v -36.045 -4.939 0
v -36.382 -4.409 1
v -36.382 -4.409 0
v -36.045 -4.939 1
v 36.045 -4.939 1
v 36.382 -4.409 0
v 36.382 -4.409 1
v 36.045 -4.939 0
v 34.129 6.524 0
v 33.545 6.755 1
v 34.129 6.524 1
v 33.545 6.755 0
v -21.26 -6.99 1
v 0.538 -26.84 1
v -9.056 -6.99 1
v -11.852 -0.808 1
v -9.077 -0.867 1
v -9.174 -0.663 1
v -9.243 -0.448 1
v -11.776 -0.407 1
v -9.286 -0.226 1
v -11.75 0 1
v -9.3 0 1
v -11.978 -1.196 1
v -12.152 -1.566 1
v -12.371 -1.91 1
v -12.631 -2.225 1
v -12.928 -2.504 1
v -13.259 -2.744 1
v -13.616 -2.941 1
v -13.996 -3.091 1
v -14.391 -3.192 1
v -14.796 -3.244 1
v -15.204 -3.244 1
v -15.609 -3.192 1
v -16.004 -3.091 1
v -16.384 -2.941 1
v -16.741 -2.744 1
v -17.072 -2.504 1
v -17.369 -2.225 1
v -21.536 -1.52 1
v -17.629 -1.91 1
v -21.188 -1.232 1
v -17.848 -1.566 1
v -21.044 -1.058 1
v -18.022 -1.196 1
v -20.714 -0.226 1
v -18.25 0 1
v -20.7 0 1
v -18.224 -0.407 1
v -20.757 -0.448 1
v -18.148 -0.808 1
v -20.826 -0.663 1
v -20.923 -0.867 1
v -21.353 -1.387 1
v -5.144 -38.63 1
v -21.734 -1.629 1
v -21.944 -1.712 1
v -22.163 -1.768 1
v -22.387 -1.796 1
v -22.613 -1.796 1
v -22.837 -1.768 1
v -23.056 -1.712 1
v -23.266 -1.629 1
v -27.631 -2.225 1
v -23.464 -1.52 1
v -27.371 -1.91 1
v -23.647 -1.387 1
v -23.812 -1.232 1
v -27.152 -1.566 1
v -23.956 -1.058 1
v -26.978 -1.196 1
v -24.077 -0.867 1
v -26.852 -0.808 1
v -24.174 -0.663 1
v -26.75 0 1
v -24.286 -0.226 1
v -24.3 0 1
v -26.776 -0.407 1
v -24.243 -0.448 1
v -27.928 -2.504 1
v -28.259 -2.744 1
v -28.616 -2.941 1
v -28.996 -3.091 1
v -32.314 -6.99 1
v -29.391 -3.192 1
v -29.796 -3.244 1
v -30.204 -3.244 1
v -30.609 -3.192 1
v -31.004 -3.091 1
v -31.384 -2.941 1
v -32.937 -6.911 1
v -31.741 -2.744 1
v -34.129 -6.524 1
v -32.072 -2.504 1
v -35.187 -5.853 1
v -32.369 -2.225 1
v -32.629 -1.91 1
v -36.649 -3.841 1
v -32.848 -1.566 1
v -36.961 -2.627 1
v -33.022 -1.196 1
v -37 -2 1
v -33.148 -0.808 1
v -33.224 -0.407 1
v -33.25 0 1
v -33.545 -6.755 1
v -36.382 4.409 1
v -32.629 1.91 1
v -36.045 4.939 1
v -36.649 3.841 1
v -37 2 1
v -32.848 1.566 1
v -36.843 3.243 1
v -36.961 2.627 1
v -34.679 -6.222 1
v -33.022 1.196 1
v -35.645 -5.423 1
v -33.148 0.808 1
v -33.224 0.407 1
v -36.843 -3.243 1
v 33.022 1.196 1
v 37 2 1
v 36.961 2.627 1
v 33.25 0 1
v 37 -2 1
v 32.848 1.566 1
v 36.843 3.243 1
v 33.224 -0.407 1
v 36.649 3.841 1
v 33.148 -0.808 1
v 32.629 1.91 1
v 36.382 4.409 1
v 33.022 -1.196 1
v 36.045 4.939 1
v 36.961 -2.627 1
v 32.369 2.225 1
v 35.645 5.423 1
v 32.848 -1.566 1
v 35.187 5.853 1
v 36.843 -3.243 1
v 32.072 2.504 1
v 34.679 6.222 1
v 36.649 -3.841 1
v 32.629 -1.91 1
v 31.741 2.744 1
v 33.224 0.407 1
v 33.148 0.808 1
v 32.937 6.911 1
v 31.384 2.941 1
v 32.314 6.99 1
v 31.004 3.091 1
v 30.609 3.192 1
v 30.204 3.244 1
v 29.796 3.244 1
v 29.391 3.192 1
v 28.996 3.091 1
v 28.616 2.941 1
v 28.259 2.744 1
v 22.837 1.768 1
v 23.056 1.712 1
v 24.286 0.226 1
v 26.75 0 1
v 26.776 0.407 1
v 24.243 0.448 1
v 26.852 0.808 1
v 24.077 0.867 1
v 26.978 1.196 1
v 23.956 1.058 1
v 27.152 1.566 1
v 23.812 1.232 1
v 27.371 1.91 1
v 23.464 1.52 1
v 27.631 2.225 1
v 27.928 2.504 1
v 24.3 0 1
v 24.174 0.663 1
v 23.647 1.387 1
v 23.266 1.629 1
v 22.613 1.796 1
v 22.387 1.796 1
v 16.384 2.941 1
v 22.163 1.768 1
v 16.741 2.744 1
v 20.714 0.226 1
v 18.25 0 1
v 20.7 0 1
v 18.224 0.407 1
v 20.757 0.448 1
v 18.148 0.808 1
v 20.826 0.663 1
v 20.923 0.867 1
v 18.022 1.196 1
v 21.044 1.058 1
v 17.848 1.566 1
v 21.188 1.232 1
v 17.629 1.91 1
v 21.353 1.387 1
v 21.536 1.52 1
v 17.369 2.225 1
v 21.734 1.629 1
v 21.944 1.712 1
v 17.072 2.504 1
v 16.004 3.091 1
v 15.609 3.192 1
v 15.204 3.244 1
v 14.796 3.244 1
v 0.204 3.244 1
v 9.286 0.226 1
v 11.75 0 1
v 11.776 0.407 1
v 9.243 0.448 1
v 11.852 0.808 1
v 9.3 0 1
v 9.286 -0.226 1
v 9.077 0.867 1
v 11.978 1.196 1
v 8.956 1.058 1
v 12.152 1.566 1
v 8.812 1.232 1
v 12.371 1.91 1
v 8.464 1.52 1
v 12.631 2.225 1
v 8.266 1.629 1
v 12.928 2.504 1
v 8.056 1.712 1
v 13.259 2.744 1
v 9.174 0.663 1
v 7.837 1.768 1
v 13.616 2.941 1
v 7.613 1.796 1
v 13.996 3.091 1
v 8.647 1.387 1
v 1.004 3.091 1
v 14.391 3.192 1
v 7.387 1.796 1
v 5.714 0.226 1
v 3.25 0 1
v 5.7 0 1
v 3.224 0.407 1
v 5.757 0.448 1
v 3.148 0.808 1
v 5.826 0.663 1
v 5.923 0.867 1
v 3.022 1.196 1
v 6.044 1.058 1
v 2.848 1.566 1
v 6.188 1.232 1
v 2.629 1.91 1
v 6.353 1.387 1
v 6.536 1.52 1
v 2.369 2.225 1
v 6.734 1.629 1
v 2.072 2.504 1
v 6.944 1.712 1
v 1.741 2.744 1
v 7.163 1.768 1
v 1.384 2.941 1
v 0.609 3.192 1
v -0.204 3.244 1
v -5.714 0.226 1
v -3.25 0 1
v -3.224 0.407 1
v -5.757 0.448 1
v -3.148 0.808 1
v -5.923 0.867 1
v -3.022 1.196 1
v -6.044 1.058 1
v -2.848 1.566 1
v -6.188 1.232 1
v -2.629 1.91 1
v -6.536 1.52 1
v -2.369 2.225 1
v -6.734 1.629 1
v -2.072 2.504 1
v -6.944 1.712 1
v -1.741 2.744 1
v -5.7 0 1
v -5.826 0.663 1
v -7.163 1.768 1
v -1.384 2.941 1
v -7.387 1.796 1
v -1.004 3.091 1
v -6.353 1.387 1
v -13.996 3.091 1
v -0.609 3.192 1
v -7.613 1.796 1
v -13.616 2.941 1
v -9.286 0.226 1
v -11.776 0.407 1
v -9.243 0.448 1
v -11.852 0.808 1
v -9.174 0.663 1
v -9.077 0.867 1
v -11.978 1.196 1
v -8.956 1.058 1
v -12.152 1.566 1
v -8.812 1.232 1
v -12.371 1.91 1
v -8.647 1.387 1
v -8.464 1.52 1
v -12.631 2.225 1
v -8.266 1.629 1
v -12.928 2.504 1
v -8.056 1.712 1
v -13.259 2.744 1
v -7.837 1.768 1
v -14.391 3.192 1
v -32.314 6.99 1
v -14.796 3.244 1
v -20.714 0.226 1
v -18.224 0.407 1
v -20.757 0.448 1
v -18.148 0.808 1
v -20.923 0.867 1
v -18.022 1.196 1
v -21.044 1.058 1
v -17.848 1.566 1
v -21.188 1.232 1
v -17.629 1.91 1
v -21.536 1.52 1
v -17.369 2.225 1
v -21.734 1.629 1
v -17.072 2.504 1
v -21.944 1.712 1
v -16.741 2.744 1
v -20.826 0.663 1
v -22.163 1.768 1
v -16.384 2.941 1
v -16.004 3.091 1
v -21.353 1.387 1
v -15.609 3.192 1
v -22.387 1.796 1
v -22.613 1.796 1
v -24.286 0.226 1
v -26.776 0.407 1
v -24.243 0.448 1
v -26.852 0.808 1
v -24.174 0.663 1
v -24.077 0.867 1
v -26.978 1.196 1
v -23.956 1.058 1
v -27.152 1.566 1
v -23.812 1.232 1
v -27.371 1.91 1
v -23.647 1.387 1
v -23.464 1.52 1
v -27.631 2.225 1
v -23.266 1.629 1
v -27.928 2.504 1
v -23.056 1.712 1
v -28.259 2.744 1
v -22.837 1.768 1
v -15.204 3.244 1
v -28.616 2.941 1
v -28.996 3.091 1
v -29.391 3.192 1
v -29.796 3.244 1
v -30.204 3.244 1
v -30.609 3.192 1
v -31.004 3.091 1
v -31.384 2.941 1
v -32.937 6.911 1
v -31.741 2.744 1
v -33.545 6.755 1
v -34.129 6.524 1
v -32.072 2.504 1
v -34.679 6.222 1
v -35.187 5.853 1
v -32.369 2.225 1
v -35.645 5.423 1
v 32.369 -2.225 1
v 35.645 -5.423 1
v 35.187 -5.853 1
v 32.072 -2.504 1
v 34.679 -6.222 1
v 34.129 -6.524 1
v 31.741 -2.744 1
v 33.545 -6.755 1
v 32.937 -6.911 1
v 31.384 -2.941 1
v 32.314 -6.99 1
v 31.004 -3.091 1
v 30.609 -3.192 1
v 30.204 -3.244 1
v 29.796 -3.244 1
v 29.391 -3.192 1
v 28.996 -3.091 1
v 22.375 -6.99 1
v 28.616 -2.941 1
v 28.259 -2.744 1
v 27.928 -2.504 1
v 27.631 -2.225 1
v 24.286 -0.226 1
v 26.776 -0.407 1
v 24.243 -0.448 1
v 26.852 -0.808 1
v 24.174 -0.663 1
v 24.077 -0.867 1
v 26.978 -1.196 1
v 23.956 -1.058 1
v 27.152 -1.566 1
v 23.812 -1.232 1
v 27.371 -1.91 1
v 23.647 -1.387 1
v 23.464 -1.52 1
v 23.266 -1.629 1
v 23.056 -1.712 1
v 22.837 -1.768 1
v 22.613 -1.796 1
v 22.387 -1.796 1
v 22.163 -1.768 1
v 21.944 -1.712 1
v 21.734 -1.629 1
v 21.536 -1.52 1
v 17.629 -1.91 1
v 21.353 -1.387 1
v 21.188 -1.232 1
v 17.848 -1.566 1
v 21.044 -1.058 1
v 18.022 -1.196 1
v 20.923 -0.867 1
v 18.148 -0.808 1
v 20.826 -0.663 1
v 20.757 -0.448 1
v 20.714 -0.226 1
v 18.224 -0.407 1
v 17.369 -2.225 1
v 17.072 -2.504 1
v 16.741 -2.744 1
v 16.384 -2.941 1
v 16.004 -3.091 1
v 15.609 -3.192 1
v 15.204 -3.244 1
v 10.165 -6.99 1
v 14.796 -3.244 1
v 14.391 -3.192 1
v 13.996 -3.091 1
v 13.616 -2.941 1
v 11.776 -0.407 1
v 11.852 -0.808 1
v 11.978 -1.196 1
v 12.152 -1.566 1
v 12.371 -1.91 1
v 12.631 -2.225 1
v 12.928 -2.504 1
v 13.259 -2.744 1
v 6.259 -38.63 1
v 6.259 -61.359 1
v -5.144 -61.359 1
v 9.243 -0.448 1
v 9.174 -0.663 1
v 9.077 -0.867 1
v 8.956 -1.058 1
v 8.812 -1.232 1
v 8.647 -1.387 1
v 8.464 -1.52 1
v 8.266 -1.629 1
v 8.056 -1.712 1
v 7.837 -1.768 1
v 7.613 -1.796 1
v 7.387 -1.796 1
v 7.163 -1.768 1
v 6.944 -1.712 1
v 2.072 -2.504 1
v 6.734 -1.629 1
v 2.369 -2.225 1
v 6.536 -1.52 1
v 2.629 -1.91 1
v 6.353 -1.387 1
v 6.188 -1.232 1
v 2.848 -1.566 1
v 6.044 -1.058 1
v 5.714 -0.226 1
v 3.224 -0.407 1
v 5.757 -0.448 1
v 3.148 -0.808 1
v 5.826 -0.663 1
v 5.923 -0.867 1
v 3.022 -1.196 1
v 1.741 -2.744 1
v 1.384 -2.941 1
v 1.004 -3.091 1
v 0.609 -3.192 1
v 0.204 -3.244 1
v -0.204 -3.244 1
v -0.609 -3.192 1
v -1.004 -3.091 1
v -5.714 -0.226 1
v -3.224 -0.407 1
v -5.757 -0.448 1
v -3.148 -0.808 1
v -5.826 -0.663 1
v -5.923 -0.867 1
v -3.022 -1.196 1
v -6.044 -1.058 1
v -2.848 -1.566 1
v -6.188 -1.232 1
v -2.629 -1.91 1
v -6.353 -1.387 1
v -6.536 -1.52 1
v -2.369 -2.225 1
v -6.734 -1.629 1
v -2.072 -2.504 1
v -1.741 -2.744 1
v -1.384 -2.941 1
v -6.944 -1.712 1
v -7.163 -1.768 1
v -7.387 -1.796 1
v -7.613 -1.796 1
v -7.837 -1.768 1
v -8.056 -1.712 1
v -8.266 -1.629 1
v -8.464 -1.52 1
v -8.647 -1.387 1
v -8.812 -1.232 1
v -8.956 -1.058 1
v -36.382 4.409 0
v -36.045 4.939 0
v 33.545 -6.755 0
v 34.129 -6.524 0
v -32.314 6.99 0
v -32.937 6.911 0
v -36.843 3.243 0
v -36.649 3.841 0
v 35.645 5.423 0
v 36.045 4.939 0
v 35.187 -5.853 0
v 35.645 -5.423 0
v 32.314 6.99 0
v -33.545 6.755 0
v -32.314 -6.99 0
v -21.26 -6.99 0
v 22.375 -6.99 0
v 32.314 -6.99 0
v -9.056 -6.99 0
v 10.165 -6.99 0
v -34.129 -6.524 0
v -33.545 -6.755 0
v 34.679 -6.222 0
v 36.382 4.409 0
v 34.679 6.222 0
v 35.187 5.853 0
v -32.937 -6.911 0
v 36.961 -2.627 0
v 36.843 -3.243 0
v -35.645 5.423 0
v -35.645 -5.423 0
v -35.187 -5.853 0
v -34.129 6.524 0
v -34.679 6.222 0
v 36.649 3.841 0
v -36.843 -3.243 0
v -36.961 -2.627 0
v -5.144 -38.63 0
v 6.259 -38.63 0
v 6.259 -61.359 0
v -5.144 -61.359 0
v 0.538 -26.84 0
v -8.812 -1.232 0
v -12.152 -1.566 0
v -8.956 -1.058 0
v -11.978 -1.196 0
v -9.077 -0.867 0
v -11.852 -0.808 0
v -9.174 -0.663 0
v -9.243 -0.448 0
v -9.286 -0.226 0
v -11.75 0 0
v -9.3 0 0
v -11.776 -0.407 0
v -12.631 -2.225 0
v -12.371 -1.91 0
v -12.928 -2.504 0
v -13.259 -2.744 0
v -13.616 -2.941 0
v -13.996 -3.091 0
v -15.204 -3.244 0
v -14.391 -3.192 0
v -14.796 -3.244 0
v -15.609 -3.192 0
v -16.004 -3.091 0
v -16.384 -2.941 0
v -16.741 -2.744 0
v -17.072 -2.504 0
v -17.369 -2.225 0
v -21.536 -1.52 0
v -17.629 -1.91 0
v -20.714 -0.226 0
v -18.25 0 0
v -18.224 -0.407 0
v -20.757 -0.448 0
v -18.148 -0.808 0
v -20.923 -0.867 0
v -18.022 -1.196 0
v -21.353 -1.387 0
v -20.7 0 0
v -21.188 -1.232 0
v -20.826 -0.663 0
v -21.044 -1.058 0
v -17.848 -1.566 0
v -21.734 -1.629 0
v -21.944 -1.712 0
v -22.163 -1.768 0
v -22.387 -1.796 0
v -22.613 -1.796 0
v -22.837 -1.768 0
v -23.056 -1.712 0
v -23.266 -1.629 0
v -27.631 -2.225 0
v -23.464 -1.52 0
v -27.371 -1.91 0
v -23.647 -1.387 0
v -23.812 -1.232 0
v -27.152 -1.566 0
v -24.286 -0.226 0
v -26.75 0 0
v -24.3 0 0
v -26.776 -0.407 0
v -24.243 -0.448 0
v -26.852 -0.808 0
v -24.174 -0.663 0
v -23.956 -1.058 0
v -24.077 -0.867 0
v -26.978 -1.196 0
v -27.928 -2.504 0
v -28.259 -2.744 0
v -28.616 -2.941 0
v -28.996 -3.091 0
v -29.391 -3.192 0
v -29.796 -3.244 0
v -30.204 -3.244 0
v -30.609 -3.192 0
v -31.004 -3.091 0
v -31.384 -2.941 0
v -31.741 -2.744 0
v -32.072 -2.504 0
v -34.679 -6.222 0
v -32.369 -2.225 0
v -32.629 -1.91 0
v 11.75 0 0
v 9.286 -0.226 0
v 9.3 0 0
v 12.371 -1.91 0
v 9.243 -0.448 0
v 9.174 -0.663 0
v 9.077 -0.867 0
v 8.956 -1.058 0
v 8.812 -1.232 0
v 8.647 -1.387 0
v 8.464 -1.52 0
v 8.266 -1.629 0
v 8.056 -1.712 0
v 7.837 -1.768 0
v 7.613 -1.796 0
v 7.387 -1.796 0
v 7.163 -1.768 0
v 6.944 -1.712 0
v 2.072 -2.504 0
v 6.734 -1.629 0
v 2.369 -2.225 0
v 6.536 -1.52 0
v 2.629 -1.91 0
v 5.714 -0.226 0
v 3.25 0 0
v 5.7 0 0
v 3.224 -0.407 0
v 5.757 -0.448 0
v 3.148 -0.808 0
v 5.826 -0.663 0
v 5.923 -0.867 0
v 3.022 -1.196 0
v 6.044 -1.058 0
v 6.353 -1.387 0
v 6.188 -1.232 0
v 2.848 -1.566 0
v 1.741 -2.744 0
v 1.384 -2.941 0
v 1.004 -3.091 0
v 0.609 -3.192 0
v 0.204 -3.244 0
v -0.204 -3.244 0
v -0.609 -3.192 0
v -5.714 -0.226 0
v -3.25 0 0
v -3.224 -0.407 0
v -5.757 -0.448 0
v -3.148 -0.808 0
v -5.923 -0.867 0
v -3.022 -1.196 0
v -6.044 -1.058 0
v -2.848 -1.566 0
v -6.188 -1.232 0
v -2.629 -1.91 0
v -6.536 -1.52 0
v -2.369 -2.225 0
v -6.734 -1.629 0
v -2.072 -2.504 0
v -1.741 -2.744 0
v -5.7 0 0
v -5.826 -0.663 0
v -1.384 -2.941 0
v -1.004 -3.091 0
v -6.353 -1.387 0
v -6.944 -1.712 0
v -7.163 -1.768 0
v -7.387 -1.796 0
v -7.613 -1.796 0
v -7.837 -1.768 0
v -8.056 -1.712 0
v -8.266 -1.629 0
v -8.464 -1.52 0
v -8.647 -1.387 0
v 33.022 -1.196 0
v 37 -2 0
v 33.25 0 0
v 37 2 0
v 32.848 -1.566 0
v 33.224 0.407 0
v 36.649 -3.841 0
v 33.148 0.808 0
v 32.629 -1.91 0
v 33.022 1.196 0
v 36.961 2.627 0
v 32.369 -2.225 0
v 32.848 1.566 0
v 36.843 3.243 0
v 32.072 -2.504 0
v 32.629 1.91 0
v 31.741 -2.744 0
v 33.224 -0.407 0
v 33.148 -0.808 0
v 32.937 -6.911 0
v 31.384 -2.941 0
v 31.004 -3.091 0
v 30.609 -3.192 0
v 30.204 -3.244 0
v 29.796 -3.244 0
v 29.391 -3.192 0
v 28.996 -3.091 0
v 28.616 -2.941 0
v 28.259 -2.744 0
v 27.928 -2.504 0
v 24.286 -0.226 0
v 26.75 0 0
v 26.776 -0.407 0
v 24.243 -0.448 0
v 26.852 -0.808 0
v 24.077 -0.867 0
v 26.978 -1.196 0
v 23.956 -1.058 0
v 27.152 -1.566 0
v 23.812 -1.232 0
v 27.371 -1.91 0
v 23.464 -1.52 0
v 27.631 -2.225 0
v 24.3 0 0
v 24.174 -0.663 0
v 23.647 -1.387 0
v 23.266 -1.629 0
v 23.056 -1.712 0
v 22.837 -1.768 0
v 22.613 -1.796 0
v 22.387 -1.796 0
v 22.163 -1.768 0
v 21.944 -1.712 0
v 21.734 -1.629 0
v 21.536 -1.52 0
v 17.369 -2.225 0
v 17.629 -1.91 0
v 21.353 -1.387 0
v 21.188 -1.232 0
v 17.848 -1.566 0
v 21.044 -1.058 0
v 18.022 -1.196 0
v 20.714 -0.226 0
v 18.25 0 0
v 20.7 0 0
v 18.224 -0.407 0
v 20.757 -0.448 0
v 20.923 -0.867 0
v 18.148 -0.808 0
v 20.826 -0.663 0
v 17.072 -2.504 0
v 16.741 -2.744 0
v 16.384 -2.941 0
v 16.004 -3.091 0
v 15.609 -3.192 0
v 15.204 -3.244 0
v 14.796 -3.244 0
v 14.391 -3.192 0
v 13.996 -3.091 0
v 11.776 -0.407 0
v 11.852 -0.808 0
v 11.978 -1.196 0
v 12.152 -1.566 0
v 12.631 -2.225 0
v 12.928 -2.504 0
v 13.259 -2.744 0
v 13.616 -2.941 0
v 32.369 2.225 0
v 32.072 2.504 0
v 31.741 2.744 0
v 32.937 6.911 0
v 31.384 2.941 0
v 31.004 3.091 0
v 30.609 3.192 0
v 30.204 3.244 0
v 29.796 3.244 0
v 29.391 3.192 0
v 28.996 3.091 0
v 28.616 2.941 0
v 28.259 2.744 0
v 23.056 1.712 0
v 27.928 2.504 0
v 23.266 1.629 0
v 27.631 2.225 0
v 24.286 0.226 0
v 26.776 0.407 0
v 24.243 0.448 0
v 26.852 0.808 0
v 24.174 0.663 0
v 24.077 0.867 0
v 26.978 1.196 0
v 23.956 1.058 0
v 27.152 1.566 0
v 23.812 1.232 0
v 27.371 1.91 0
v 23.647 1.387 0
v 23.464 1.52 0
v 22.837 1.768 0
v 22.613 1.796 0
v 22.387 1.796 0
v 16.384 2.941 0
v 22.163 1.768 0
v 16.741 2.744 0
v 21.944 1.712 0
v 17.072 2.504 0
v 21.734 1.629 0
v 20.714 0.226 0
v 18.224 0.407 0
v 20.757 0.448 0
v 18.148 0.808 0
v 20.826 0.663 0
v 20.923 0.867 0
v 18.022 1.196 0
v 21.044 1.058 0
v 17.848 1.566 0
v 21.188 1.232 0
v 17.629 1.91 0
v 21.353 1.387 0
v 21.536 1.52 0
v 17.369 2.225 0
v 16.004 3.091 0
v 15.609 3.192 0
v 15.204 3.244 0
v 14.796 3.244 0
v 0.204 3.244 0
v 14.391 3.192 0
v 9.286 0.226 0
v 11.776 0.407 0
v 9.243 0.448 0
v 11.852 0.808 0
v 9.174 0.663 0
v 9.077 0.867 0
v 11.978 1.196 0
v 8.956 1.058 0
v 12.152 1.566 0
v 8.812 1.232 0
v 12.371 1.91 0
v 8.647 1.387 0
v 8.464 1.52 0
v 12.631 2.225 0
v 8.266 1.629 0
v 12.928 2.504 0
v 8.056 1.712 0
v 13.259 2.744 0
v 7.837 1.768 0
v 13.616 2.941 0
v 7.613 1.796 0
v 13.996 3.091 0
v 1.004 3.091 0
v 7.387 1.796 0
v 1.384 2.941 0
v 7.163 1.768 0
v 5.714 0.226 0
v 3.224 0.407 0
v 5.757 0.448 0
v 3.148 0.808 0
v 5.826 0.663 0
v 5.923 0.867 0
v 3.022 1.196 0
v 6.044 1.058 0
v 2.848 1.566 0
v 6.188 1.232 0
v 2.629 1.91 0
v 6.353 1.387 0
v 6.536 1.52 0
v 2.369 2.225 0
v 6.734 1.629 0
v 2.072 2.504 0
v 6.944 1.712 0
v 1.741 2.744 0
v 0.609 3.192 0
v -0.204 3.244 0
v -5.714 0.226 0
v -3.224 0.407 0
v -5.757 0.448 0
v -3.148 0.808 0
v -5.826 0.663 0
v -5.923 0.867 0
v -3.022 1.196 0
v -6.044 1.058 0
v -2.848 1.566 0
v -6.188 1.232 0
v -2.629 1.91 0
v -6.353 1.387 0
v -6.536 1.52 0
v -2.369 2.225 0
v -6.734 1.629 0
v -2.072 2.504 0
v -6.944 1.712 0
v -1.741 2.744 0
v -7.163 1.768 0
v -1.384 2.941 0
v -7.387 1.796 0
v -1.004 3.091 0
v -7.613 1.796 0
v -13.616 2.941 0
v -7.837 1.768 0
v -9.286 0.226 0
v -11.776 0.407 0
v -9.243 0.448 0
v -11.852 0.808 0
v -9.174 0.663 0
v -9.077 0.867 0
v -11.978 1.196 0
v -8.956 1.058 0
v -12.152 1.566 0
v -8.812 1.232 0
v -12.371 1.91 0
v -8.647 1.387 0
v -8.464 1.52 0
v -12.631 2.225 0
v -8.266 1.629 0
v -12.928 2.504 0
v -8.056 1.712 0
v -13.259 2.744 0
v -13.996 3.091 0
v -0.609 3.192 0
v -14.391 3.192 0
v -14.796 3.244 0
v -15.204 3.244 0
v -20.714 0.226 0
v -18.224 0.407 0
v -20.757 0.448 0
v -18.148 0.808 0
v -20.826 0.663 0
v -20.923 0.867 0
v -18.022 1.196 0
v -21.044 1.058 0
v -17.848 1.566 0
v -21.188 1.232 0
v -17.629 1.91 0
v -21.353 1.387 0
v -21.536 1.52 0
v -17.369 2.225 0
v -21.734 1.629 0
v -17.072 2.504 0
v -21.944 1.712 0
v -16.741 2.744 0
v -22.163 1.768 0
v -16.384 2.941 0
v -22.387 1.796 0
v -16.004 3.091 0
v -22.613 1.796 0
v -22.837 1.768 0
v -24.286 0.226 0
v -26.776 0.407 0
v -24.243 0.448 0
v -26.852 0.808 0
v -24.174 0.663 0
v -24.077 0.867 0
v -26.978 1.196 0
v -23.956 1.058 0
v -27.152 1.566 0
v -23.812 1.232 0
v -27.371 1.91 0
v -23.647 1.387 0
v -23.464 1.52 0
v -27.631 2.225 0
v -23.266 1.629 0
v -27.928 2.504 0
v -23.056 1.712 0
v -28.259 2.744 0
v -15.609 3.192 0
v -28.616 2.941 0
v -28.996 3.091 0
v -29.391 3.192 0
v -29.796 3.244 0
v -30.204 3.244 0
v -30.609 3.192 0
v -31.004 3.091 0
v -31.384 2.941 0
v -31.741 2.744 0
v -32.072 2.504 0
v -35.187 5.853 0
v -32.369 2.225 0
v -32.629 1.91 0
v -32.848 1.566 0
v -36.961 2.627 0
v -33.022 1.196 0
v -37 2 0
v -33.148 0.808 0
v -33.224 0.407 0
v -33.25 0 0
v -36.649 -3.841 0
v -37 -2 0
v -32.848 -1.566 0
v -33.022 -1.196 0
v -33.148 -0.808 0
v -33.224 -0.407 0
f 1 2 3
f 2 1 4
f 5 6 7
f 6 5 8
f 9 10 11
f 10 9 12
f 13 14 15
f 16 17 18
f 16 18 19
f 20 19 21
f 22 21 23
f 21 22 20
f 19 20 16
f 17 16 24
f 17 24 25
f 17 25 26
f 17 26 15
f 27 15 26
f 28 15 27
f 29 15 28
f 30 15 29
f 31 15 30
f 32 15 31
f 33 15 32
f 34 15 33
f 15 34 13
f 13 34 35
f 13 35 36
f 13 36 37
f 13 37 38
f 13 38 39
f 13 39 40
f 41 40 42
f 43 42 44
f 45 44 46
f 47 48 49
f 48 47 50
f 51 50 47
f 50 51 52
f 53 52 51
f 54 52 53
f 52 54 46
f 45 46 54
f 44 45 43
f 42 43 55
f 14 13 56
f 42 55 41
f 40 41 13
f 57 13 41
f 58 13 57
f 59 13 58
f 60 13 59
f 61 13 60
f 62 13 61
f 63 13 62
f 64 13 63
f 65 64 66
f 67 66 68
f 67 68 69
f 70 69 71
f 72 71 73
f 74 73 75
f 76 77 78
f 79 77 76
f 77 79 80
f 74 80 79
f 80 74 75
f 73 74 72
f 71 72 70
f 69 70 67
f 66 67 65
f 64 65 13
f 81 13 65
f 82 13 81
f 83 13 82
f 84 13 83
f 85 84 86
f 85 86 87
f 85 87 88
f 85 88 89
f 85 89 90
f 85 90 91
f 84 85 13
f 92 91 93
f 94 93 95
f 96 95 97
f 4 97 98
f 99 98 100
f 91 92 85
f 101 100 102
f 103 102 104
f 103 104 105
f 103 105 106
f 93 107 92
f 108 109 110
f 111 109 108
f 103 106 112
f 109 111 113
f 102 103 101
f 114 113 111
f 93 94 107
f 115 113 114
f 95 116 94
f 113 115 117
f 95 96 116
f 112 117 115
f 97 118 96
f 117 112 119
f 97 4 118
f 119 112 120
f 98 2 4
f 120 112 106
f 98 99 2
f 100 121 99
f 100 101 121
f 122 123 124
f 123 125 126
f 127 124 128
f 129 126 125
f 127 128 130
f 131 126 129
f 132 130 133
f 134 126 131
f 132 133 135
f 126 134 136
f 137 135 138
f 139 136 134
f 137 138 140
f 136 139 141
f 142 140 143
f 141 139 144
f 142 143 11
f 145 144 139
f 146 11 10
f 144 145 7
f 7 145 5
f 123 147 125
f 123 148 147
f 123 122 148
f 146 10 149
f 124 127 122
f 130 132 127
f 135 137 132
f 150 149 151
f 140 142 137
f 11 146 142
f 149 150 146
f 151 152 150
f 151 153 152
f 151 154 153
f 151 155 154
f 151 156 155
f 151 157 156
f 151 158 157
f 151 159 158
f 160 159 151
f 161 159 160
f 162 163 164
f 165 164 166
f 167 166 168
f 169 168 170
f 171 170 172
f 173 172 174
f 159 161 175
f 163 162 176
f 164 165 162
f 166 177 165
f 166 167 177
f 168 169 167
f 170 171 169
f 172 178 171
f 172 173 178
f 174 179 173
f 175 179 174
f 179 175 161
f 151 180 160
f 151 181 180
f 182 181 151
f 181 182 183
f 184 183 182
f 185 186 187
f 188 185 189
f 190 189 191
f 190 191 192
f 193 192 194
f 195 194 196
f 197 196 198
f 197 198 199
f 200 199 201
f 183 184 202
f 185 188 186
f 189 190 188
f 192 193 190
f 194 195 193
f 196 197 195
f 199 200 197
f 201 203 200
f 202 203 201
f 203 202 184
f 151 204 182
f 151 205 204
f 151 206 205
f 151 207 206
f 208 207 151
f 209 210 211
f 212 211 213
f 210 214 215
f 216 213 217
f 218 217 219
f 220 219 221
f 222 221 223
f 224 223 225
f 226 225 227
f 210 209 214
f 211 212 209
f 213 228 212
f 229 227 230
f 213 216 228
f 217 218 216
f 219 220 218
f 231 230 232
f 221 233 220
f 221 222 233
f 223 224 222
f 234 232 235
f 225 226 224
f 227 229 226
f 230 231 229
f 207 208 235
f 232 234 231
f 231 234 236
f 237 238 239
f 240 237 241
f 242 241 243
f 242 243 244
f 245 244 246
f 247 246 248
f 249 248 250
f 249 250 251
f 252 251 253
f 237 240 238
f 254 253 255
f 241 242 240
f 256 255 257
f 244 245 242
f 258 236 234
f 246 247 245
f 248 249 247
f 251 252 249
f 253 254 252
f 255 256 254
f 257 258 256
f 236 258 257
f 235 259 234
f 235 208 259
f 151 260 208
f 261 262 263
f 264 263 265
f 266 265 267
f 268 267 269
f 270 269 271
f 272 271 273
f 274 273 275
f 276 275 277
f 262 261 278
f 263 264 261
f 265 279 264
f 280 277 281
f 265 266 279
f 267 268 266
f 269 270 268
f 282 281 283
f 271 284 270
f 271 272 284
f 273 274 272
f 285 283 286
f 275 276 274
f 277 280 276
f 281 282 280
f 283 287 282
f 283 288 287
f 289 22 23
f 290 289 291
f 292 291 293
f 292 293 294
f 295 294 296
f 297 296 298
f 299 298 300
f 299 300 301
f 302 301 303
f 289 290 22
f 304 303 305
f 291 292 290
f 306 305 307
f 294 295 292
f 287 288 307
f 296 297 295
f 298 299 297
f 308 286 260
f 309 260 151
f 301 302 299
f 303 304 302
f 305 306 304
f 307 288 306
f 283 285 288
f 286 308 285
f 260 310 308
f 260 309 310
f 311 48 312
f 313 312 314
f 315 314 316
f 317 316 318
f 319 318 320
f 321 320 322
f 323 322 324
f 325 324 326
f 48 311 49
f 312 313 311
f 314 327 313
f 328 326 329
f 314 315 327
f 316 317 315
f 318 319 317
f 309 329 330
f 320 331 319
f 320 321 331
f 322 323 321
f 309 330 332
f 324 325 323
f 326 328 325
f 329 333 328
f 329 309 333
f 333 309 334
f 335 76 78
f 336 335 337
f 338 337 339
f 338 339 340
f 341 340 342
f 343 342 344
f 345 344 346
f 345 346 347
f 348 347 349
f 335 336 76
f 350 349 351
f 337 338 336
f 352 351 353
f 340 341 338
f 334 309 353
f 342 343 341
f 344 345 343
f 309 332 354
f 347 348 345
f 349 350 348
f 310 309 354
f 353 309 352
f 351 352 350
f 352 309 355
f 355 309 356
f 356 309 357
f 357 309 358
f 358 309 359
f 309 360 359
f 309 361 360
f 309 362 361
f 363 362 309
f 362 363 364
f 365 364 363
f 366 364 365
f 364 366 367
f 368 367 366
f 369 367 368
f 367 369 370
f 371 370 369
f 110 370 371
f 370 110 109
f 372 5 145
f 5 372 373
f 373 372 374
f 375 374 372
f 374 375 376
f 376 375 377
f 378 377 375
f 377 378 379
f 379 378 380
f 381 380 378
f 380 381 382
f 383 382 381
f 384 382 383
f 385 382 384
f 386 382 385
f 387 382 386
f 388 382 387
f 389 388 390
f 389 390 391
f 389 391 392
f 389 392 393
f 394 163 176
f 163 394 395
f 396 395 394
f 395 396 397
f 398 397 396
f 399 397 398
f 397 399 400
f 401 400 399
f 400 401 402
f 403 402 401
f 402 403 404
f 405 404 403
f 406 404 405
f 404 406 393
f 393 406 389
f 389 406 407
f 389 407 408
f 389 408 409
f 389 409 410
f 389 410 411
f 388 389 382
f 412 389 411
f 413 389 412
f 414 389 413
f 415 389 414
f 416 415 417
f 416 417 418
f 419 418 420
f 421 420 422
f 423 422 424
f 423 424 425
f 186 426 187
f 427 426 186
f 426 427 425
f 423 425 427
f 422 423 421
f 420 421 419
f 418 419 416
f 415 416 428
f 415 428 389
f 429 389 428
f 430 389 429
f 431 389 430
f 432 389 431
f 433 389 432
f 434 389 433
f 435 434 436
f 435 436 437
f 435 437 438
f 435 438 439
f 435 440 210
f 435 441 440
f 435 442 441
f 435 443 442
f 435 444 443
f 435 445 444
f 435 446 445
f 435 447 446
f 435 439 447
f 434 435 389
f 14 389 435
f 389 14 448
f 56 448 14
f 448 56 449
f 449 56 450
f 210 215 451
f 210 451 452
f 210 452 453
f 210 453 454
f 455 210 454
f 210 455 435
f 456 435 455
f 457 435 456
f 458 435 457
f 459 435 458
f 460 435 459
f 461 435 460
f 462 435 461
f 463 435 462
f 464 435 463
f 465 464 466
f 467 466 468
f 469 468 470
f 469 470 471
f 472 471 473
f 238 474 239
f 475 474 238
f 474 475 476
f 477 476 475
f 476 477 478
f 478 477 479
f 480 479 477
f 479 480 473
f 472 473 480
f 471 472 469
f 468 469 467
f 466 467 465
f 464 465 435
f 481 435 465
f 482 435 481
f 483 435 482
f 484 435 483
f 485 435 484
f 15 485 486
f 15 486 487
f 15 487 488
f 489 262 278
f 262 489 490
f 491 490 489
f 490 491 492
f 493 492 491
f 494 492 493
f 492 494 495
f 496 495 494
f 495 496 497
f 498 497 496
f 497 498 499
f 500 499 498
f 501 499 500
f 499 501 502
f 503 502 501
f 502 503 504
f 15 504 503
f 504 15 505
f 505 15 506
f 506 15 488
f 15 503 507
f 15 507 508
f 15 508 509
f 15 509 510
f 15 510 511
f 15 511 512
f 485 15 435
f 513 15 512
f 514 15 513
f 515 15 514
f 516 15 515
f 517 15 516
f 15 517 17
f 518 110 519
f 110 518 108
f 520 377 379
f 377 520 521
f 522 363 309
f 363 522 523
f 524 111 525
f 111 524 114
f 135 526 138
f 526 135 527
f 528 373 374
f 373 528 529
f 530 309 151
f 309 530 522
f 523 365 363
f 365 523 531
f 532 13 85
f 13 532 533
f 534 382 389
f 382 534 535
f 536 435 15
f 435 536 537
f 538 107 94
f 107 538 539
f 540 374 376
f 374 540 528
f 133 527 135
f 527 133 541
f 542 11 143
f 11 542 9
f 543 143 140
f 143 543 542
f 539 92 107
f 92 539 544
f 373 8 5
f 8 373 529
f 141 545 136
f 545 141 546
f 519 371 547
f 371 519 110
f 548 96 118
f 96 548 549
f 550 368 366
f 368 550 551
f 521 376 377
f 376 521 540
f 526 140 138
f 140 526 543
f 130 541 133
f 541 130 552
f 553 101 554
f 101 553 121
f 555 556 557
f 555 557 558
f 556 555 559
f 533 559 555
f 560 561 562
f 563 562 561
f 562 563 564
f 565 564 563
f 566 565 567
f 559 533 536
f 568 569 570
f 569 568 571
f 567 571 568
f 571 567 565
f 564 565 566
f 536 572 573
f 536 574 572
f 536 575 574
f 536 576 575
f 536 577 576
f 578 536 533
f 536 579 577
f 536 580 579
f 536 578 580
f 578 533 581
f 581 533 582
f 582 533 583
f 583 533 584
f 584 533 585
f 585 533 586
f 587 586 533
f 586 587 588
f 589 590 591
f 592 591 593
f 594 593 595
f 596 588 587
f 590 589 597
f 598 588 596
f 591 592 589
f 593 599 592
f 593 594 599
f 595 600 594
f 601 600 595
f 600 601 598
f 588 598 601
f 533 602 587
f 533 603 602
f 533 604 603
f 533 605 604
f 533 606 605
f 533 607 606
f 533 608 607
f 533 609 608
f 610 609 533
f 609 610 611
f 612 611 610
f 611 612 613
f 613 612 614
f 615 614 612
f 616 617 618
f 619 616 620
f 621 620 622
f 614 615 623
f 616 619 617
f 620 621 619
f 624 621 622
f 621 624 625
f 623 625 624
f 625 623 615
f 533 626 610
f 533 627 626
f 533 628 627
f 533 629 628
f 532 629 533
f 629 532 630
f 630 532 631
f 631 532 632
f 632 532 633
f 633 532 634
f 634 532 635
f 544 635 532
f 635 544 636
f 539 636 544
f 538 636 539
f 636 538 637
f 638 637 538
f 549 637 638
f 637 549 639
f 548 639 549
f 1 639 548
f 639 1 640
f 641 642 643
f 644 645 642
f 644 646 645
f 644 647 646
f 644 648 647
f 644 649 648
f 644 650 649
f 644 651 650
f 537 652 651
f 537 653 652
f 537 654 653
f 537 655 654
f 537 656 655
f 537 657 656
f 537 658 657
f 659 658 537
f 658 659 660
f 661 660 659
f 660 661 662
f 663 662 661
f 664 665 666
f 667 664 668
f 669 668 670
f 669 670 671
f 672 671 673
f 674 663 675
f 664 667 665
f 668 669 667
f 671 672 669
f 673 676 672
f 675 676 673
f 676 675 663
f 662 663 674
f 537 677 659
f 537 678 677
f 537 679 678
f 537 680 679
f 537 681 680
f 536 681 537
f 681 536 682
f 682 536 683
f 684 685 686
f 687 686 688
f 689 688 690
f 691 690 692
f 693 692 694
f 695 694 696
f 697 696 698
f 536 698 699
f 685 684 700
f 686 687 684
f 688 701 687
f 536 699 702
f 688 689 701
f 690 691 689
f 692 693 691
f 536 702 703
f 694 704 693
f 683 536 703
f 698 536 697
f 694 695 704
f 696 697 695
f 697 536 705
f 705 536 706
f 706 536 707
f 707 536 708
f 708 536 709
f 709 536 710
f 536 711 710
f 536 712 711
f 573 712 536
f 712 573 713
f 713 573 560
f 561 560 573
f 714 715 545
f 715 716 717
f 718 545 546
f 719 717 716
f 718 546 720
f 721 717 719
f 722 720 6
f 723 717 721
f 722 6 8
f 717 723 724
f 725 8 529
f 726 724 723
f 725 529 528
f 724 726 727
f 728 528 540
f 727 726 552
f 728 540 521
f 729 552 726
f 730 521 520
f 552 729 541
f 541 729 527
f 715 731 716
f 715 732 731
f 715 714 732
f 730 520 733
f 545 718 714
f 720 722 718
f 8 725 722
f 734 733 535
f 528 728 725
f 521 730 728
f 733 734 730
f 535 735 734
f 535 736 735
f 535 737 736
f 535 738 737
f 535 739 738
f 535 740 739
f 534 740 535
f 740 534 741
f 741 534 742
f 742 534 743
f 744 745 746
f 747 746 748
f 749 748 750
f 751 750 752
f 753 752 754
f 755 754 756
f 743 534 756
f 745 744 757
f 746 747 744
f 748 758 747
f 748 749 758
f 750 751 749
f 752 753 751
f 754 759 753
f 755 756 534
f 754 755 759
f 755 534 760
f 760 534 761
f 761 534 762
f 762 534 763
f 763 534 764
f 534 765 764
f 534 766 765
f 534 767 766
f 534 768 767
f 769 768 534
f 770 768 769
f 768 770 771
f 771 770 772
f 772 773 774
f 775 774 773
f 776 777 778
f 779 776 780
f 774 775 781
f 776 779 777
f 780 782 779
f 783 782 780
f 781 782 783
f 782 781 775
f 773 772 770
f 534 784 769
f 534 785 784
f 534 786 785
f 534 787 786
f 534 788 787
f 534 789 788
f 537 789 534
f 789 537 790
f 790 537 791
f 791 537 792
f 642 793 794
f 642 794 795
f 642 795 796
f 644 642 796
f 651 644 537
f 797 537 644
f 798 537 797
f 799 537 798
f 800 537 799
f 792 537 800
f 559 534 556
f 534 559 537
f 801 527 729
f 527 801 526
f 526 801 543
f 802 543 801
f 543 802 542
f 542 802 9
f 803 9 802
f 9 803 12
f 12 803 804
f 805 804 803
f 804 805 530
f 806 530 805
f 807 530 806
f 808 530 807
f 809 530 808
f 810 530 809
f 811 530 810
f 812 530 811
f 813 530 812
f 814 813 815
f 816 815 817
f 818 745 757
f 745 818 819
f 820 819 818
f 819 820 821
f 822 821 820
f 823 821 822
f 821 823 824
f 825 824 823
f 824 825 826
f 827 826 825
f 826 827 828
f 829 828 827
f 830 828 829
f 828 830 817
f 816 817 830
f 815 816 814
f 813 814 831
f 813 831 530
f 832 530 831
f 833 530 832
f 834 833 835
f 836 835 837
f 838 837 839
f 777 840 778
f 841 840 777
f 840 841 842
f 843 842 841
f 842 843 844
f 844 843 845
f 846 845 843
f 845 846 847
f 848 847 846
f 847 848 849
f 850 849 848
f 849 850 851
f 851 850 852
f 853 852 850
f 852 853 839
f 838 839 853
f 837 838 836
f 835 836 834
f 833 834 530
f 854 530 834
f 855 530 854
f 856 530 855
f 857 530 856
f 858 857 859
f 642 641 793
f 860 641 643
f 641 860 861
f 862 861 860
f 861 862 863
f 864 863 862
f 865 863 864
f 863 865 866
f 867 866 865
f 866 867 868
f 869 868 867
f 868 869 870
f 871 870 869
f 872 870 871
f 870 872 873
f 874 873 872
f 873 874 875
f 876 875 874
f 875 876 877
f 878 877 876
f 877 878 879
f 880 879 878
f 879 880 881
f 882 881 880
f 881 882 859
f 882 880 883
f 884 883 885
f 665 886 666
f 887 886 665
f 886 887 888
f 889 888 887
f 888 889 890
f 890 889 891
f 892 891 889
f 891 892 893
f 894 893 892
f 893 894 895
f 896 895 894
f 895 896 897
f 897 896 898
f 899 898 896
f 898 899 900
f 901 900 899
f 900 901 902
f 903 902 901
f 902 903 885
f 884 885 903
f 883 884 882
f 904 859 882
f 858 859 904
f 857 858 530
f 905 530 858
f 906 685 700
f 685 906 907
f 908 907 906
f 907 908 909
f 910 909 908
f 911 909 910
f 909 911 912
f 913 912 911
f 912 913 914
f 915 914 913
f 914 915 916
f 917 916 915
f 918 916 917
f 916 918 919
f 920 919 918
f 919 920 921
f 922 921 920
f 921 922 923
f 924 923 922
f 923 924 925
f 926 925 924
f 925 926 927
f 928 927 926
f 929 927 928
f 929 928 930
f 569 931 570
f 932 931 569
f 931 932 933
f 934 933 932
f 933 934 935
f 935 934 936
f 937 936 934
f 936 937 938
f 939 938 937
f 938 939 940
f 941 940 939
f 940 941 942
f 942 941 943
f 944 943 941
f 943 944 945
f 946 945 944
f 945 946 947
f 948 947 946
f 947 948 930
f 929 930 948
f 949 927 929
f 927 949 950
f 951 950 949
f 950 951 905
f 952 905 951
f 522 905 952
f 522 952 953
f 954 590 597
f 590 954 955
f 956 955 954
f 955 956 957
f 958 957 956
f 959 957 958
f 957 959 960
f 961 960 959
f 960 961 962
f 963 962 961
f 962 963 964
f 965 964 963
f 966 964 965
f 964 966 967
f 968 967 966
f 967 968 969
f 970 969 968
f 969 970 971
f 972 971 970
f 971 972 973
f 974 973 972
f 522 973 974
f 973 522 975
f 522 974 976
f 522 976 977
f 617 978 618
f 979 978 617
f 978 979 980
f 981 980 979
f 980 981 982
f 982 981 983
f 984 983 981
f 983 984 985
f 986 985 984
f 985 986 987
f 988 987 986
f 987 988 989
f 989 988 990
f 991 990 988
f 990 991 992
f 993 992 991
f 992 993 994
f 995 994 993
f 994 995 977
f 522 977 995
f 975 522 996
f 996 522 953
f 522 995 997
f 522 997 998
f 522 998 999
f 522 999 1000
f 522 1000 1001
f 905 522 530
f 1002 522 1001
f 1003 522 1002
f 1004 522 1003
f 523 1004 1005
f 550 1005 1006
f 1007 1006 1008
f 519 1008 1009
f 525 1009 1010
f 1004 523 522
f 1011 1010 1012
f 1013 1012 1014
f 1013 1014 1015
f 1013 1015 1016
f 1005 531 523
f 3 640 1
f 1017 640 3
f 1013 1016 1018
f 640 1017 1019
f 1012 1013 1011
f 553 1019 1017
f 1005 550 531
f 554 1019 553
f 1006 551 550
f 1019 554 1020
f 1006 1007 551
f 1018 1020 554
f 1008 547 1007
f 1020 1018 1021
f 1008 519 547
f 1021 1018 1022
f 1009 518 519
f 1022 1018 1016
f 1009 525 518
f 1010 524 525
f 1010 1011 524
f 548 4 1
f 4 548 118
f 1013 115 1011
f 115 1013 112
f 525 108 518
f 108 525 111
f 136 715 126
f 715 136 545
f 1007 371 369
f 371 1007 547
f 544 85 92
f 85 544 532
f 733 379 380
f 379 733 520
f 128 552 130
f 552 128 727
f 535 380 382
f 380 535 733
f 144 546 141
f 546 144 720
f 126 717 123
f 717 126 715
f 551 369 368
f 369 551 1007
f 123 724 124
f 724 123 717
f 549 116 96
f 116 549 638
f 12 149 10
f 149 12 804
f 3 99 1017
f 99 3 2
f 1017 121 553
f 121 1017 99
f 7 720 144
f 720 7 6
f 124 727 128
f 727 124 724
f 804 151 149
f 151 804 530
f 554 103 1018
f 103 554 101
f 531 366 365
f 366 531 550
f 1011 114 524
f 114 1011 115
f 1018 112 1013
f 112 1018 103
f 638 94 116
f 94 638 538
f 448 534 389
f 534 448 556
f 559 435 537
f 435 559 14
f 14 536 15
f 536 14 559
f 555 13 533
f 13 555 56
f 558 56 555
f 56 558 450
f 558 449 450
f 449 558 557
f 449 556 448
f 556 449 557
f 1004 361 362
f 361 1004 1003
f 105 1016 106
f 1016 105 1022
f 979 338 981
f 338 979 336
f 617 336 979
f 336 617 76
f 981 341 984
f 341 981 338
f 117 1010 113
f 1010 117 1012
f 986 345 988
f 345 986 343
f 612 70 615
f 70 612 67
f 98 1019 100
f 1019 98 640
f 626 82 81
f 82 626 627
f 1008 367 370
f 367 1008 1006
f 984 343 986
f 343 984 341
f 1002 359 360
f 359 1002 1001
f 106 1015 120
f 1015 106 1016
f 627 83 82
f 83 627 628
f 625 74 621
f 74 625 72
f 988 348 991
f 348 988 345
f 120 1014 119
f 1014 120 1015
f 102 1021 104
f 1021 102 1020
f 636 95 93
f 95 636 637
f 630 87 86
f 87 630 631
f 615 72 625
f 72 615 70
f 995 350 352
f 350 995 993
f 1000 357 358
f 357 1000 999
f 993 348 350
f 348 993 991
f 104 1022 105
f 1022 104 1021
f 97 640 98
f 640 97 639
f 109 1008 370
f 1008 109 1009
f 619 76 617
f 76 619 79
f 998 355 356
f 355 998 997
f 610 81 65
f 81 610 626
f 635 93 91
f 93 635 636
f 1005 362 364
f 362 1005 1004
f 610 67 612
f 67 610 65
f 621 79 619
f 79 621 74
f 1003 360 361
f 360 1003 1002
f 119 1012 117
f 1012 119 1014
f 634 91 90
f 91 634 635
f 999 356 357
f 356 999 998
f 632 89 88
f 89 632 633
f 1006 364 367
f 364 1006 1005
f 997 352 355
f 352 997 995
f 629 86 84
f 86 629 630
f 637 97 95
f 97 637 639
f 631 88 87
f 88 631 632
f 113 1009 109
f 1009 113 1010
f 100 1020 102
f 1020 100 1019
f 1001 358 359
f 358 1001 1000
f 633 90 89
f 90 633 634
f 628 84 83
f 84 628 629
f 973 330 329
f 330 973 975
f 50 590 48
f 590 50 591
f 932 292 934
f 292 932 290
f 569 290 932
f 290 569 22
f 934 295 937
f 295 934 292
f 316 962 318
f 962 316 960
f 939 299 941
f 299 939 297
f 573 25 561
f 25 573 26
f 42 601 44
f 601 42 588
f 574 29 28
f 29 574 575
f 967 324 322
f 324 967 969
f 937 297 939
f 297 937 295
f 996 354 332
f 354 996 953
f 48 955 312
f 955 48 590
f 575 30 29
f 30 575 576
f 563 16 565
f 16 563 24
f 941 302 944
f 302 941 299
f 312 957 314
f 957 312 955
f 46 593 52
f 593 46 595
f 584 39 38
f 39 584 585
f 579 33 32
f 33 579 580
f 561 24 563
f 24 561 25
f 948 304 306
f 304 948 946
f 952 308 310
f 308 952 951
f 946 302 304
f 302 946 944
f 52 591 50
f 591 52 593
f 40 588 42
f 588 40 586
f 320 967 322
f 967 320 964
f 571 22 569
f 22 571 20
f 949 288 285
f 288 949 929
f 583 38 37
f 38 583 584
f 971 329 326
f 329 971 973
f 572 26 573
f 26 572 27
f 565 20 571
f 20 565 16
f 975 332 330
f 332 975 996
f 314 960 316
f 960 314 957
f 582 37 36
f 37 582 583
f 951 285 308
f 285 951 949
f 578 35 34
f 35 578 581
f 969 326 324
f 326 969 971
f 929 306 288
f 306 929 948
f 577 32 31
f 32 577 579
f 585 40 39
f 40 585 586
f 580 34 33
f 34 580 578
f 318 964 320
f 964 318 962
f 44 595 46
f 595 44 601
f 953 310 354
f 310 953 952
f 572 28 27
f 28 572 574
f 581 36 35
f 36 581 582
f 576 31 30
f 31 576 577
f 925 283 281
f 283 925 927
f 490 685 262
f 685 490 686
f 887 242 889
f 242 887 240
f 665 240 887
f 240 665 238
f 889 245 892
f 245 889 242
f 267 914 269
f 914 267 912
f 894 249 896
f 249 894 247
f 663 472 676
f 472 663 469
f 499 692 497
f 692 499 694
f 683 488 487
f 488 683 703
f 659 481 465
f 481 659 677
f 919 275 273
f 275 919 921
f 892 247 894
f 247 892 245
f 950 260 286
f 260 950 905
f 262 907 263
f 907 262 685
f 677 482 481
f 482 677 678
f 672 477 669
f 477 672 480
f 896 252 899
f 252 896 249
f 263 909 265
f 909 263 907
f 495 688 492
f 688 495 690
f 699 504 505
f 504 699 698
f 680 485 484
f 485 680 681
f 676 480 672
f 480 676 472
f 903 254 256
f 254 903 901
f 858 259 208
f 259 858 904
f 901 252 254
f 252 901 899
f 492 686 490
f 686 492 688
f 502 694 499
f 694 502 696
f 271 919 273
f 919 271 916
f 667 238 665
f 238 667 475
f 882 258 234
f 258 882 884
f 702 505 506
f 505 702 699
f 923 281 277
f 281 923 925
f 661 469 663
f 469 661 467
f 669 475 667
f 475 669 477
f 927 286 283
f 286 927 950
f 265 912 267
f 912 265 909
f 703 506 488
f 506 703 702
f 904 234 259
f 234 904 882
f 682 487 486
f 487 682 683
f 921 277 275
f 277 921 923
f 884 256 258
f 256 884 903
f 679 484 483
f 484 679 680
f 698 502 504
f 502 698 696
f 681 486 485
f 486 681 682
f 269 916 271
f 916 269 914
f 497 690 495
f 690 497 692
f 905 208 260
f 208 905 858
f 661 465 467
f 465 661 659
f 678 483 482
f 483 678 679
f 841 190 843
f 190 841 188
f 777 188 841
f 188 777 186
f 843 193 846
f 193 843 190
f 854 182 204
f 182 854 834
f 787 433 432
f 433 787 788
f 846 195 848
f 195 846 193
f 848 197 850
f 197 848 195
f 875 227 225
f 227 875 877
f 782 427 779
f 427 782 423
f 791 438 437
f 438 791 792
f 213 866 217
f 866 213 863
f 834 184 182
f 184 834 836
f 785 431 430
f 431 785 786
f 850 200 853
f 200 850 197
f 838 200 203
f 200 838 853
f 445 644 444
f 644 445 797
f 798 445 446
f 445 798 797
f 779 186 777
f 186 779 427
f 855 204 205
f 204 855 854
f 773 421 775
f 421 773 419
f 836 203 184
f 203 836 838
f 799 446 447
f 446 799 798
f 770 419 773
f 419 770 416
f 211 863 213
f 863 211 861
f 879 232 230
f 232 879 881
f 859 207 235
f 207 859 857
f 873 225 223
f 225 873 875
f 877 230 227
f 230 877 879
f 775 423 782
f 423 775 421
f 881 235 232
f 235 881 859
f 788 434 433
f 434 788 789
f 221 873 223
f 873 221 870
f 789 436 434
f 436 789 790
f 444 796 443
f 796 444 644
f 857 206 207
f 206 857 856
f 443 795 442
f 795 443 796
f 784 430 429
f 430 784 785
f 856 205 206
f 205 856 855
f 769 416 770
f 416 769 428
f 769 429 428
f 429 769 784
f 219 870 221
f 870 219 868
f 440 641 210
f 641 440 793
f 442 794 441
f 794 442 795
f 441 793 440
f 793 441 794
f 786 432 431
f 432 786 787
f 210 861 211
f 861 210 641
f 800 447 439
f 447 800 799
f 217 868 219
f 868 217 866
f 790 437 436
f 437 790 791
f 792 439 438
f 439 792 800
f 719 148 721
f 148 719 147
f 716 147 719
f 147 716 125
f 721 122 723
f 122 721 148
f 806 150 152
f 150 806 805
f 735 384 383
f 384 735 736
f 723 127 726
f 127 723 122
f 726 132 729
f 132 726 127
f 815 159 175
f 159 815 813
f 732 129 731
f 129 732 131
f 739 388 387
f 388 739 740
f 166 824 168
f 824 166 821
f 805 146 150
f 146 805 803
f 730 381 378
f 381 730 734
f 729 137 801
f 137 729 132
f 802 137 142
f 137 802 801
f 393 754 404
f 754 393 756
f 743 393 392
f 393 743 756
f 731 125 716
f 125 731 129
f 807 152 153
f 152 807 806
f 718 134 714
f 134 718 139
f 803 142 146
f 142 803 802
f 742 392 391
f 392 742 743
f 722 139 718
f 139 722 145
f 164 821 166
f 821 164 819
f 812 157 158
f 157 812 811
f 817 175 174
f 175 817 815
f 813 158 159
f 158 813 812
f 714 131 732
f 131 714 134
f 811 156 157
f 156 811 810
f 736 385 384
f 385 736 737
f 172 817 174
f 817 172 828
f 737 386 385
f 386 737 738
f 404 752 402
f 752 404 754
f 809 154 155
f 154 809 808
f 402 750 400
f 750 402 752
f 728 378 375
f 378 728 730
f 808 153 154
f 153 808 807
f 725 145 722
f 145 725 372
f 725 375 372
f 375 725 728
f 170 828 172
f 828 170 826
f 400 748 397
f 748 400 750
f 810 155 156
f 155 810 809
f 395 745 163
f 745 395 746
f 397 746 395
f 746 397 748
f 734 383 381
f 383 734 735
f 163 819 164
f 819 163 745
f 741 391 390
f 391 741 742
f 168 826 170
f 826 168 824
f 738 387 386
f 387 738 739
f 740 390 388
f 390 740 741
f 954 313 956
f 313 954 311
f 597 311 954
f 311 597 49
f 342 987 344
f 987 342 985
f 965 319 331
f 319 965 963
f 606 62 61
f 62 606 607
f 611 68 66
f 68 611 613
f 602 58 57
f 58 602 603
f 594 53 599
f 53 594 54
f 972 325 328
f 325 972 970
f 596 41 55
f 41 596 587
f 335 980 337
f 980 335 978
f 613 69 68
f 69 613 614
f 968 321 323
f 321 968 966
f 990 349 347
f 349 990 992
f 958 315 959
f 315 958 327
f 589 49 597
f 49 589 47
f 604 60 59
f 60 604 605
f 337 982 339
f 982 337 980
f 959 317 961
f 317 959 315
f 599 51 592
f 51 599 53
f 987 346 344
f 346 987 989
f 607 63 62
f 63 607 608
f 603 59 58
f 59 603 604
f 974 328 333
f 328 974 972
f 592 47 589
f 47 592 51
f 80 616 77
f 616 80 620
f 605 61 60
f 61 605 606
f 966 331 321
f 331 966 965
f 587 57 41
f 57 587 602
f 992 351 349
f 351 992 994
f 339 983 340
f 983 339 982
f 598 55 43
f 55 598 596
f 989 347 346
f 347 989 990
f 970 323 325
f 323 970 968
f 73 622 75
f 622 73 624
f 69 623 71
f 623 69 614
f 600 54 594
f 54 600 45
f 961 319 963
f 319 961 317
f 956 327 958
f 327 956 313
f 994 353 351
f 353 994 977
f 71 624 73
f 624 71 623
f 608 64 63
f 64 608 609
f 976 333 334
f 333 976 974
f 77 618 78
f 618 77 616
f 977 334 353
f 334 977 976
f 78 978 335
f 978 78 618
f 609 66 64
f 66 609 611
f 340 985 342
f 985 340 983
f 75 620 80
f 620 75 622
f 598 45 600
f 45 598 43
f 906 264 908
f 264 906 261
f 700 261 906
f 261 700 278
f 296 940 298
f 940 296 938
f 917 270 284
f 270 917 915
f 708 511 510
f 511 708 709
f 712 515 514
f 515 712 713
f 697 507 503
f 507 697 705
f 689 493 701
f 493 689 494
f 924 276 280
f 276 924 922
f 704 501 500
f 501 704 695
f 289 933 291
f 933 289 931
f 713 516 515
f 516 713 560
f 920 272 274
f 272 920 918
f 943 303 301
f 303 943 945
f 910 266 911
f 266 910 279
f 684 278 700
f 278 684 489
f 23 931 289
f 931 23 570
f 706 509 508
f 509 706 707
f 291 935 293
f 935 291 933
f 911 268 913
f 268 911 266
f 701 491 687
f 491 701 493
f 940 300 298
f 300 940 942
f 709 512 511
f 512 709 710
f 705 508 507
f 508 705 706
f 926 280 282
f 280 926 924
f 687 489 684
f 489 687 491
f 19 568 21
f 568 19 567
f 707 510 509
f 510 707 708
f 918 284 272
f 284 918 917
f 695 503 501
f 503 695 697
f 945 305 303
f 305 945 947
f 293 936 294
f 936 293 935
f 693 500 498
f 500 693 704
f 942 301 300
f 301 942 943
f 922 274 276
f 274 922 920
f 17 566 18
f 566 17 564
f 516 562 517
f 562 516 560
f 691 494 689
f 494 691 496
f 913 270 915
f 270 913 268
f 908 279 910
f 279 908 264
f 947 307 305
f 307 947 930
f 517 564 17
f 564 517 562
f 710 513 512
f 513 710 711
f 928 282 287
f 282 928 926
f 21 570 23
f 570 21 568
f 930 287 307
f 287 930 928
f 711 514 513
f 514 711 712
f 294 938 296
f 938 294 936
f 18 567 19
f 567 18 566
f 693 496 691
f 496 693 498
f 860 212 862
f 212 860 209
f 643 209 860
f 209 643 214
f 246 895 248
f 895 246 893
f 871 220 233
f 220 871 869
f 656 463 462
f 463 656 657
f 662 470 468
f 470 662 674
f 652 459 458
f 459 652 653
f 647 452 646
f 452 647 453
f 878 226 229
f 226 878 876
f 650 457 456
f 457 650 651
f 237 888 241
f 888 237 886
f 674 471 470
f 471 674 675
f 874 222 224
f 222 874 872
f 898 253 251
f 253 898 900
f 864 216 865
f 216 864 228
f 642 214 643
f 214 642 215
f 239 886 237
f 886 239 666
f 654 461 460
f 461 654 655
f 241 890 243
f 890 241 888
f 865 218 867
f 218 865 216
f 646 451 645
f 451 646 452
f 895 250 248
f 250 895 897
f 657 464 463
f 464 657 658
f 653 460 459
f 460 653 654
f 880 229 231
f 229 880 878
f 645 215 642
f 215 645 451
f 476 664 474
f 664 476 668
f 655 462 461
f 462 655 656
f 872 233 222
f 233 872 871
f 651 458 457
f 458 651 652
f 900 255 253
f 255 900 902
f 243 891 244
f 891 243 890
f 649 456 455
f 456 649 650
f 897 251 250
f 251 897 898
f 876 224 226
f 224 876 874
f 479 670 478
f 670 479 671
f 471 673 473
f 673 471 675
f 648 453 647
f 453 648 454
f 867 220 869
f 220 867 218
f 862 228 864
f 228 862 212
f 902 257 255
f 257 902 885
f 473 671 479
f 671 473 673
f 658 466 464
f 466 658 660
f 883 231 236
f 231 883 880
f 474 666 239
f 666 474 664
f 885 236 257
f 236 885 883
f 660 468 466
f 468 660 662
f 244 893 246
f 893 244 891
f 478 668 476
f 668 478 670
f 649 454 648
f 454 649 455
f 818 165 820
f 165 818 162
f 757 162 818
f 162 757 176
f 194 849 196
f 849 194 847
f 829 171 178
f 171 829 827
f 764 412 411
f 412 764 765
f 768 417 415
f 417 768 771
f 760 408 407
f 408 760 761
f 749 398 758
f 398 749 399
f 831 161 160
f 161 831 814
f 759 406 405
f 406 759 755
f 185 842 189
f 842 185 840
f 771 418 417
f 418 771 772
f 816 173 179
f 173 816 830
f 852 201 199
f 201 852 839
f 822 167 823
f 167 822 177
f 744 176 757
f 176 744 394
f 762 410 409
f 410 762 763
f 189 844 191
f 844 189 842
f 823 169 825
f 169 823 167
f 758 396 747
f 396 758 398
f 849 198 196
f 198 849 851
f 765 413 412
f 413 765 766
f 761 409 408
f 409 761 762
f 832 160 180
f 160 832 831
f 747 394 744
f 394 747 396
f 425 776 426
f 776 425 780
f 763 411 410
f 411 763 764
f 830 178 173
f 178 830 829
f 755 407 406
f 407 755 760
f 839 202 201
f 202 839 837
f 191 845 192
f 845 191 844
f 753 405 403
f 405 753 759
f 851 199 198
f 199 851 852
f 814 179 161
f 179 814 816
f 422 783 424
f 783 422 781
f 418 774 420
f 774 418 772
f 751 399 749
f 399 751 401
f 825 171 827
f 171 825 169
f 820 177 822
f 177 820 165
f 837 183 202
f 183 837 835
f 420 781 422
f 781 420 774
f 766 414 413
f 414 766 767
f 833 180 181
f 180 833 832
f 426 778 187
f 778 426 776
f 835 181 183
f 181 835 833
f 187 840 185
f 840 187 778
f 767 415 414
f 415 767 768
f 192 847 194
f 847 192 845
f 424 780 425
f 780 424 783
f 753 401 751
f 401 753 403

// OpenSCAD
$fn = 50;


difference() {
	union() {
		*color(alpha = 1.0000000000, c = "gray") {
			translate(v = [0, 14, 0]) {
				linear_extrude(height = 1) {
					text(font = "Arial:style=Bold", halign = "center", size = 4.5000000000, text = "COMMENT description oobb_plate_shape_p_type_1_depth_5_width_1_thickness_y_extra_oobb_size", valign = "center");
				}
			}
		}
		hull() {
			translate(v = [-32.0000000000, 2.0000000000, 0]) {
				cylinder(h = 1, r = 5);
			}
			translate(v = [32.0000000000, 2.0000000000, 0]) {
				cylinder(h = 1, r = 5);
			}
			translate(v = [-32.0000000000, -2.0000000000, 0]) {
				cylinder(h = 1, r = 5);
			}
			translate(v = [32.0000000000, -2.0000000000, 0]) {
				cylinder(h = 1, r = 5);
			}
		}
		translate(v = [0, -5, 0]) {
			linear_extrude(height = 1) {
				text(font = "DejaVu Sans Mono:style=Bold", halign = "center", size = 57.0000000000, text = "Y", valign = "top");
			}
		}
	}
	union() {
		*color(alpha = 1.0000000000, c = "gray") {
			translate(v = [0, 14, 0]) {
				linear_extrude(height = 1) {
					text(font = "Arial:style=Bold", halign = "center", size = 4.5000000000, text = "COMMENT description oobb_holes_shape_n_type_5_width_1_thickness_y_extra_oobb_size_1_height_'all'_holes_true_both_holes", valign = "center");
				}
			}
		}
		translate(v = [-30.0000000000, 0.0000000000, 0]) {
			translate(v = [0, 0, -50]) {
				cylinder(h = 100, r = 3.2500000000);
			}
		}
		translate(v = [-15.0000000000, 0.0000000000, 0]) {
			translate(v = [0, 0, -50]) {
				cylinder(h = 100, r = 3.2500000000);
			}
		}
		translate(v = [0, 0, -50]) {
			cylinder(h = 100, r = 3.2500000000);
		}
		translate(v = [15.0000000000, 0.0000000000, 0]) {
			translate(v = [0, 0, -50]) {
				cylinder(h = 100, r = 3.2500000000);
			}
		}
		translate(v = [30.0000000000, 0.0000000000, 0]) {
			translate(v = [0, 0, -50]) {
				cylinder(h = 100, r = 3.2500000000);
			}
		}
		translate(v = [-30.0000000000, 0.0000000000, 0]) {
			translate(v = [0, 0, -50]) {
				cylinder(h = 100, r = 1.8000000000);
			}
		}
		translate(v = [-22.5000000000, 0.0000000000, 0]) {
			translate(v = [0, 0, -50]) {
				cylinder(h = 100, r = 1.8000000000);
			}
		}
		translate(v = [-15.0000000000, 0.0000000000, 0]) {
			translate(v = [0, 0, -50]) {
				cylinder(h = 100, r = 1.8000000000);
			}
		}
		translate(v = [-7.5000000000, 0.0000000000, 0]) {
			translate(v = [0, 0, -50]) {
				cylinder(h = 100, r = 1.8000000000);
			}
		}
		translate(v = [0, 0, -50]) {
			cylinder(h = 100, r = 1.8000000000);
		}
		translate(v = [7.5000000000, 0.0000000000, 0]) {
			translate(v = [0, 0, -50]) {
				cylinder(h = 100, r = 1.8000000000);
			}
		}
		translate(v = [15.0000000000, 0.0000000000, 0]) {
			translate(v = [0, 0, -50]) {
				cylinder(h = 100, r = 1.8000000000);
			}
		}
		translate(v = [22.5000000000, 0.0000000000, 0]) {
			translate(v = [0, 0, -50]) {
				cylinder(h = 100, r = 1.8000000000);
			}
		}
		translate(v = [30.0000000000, 0.0000000000, 0]) {
			translate(v = [0, 0, -50]) {
				cylinder(h = 100, r = 1.8000000000);
			}
		}
	}
}
